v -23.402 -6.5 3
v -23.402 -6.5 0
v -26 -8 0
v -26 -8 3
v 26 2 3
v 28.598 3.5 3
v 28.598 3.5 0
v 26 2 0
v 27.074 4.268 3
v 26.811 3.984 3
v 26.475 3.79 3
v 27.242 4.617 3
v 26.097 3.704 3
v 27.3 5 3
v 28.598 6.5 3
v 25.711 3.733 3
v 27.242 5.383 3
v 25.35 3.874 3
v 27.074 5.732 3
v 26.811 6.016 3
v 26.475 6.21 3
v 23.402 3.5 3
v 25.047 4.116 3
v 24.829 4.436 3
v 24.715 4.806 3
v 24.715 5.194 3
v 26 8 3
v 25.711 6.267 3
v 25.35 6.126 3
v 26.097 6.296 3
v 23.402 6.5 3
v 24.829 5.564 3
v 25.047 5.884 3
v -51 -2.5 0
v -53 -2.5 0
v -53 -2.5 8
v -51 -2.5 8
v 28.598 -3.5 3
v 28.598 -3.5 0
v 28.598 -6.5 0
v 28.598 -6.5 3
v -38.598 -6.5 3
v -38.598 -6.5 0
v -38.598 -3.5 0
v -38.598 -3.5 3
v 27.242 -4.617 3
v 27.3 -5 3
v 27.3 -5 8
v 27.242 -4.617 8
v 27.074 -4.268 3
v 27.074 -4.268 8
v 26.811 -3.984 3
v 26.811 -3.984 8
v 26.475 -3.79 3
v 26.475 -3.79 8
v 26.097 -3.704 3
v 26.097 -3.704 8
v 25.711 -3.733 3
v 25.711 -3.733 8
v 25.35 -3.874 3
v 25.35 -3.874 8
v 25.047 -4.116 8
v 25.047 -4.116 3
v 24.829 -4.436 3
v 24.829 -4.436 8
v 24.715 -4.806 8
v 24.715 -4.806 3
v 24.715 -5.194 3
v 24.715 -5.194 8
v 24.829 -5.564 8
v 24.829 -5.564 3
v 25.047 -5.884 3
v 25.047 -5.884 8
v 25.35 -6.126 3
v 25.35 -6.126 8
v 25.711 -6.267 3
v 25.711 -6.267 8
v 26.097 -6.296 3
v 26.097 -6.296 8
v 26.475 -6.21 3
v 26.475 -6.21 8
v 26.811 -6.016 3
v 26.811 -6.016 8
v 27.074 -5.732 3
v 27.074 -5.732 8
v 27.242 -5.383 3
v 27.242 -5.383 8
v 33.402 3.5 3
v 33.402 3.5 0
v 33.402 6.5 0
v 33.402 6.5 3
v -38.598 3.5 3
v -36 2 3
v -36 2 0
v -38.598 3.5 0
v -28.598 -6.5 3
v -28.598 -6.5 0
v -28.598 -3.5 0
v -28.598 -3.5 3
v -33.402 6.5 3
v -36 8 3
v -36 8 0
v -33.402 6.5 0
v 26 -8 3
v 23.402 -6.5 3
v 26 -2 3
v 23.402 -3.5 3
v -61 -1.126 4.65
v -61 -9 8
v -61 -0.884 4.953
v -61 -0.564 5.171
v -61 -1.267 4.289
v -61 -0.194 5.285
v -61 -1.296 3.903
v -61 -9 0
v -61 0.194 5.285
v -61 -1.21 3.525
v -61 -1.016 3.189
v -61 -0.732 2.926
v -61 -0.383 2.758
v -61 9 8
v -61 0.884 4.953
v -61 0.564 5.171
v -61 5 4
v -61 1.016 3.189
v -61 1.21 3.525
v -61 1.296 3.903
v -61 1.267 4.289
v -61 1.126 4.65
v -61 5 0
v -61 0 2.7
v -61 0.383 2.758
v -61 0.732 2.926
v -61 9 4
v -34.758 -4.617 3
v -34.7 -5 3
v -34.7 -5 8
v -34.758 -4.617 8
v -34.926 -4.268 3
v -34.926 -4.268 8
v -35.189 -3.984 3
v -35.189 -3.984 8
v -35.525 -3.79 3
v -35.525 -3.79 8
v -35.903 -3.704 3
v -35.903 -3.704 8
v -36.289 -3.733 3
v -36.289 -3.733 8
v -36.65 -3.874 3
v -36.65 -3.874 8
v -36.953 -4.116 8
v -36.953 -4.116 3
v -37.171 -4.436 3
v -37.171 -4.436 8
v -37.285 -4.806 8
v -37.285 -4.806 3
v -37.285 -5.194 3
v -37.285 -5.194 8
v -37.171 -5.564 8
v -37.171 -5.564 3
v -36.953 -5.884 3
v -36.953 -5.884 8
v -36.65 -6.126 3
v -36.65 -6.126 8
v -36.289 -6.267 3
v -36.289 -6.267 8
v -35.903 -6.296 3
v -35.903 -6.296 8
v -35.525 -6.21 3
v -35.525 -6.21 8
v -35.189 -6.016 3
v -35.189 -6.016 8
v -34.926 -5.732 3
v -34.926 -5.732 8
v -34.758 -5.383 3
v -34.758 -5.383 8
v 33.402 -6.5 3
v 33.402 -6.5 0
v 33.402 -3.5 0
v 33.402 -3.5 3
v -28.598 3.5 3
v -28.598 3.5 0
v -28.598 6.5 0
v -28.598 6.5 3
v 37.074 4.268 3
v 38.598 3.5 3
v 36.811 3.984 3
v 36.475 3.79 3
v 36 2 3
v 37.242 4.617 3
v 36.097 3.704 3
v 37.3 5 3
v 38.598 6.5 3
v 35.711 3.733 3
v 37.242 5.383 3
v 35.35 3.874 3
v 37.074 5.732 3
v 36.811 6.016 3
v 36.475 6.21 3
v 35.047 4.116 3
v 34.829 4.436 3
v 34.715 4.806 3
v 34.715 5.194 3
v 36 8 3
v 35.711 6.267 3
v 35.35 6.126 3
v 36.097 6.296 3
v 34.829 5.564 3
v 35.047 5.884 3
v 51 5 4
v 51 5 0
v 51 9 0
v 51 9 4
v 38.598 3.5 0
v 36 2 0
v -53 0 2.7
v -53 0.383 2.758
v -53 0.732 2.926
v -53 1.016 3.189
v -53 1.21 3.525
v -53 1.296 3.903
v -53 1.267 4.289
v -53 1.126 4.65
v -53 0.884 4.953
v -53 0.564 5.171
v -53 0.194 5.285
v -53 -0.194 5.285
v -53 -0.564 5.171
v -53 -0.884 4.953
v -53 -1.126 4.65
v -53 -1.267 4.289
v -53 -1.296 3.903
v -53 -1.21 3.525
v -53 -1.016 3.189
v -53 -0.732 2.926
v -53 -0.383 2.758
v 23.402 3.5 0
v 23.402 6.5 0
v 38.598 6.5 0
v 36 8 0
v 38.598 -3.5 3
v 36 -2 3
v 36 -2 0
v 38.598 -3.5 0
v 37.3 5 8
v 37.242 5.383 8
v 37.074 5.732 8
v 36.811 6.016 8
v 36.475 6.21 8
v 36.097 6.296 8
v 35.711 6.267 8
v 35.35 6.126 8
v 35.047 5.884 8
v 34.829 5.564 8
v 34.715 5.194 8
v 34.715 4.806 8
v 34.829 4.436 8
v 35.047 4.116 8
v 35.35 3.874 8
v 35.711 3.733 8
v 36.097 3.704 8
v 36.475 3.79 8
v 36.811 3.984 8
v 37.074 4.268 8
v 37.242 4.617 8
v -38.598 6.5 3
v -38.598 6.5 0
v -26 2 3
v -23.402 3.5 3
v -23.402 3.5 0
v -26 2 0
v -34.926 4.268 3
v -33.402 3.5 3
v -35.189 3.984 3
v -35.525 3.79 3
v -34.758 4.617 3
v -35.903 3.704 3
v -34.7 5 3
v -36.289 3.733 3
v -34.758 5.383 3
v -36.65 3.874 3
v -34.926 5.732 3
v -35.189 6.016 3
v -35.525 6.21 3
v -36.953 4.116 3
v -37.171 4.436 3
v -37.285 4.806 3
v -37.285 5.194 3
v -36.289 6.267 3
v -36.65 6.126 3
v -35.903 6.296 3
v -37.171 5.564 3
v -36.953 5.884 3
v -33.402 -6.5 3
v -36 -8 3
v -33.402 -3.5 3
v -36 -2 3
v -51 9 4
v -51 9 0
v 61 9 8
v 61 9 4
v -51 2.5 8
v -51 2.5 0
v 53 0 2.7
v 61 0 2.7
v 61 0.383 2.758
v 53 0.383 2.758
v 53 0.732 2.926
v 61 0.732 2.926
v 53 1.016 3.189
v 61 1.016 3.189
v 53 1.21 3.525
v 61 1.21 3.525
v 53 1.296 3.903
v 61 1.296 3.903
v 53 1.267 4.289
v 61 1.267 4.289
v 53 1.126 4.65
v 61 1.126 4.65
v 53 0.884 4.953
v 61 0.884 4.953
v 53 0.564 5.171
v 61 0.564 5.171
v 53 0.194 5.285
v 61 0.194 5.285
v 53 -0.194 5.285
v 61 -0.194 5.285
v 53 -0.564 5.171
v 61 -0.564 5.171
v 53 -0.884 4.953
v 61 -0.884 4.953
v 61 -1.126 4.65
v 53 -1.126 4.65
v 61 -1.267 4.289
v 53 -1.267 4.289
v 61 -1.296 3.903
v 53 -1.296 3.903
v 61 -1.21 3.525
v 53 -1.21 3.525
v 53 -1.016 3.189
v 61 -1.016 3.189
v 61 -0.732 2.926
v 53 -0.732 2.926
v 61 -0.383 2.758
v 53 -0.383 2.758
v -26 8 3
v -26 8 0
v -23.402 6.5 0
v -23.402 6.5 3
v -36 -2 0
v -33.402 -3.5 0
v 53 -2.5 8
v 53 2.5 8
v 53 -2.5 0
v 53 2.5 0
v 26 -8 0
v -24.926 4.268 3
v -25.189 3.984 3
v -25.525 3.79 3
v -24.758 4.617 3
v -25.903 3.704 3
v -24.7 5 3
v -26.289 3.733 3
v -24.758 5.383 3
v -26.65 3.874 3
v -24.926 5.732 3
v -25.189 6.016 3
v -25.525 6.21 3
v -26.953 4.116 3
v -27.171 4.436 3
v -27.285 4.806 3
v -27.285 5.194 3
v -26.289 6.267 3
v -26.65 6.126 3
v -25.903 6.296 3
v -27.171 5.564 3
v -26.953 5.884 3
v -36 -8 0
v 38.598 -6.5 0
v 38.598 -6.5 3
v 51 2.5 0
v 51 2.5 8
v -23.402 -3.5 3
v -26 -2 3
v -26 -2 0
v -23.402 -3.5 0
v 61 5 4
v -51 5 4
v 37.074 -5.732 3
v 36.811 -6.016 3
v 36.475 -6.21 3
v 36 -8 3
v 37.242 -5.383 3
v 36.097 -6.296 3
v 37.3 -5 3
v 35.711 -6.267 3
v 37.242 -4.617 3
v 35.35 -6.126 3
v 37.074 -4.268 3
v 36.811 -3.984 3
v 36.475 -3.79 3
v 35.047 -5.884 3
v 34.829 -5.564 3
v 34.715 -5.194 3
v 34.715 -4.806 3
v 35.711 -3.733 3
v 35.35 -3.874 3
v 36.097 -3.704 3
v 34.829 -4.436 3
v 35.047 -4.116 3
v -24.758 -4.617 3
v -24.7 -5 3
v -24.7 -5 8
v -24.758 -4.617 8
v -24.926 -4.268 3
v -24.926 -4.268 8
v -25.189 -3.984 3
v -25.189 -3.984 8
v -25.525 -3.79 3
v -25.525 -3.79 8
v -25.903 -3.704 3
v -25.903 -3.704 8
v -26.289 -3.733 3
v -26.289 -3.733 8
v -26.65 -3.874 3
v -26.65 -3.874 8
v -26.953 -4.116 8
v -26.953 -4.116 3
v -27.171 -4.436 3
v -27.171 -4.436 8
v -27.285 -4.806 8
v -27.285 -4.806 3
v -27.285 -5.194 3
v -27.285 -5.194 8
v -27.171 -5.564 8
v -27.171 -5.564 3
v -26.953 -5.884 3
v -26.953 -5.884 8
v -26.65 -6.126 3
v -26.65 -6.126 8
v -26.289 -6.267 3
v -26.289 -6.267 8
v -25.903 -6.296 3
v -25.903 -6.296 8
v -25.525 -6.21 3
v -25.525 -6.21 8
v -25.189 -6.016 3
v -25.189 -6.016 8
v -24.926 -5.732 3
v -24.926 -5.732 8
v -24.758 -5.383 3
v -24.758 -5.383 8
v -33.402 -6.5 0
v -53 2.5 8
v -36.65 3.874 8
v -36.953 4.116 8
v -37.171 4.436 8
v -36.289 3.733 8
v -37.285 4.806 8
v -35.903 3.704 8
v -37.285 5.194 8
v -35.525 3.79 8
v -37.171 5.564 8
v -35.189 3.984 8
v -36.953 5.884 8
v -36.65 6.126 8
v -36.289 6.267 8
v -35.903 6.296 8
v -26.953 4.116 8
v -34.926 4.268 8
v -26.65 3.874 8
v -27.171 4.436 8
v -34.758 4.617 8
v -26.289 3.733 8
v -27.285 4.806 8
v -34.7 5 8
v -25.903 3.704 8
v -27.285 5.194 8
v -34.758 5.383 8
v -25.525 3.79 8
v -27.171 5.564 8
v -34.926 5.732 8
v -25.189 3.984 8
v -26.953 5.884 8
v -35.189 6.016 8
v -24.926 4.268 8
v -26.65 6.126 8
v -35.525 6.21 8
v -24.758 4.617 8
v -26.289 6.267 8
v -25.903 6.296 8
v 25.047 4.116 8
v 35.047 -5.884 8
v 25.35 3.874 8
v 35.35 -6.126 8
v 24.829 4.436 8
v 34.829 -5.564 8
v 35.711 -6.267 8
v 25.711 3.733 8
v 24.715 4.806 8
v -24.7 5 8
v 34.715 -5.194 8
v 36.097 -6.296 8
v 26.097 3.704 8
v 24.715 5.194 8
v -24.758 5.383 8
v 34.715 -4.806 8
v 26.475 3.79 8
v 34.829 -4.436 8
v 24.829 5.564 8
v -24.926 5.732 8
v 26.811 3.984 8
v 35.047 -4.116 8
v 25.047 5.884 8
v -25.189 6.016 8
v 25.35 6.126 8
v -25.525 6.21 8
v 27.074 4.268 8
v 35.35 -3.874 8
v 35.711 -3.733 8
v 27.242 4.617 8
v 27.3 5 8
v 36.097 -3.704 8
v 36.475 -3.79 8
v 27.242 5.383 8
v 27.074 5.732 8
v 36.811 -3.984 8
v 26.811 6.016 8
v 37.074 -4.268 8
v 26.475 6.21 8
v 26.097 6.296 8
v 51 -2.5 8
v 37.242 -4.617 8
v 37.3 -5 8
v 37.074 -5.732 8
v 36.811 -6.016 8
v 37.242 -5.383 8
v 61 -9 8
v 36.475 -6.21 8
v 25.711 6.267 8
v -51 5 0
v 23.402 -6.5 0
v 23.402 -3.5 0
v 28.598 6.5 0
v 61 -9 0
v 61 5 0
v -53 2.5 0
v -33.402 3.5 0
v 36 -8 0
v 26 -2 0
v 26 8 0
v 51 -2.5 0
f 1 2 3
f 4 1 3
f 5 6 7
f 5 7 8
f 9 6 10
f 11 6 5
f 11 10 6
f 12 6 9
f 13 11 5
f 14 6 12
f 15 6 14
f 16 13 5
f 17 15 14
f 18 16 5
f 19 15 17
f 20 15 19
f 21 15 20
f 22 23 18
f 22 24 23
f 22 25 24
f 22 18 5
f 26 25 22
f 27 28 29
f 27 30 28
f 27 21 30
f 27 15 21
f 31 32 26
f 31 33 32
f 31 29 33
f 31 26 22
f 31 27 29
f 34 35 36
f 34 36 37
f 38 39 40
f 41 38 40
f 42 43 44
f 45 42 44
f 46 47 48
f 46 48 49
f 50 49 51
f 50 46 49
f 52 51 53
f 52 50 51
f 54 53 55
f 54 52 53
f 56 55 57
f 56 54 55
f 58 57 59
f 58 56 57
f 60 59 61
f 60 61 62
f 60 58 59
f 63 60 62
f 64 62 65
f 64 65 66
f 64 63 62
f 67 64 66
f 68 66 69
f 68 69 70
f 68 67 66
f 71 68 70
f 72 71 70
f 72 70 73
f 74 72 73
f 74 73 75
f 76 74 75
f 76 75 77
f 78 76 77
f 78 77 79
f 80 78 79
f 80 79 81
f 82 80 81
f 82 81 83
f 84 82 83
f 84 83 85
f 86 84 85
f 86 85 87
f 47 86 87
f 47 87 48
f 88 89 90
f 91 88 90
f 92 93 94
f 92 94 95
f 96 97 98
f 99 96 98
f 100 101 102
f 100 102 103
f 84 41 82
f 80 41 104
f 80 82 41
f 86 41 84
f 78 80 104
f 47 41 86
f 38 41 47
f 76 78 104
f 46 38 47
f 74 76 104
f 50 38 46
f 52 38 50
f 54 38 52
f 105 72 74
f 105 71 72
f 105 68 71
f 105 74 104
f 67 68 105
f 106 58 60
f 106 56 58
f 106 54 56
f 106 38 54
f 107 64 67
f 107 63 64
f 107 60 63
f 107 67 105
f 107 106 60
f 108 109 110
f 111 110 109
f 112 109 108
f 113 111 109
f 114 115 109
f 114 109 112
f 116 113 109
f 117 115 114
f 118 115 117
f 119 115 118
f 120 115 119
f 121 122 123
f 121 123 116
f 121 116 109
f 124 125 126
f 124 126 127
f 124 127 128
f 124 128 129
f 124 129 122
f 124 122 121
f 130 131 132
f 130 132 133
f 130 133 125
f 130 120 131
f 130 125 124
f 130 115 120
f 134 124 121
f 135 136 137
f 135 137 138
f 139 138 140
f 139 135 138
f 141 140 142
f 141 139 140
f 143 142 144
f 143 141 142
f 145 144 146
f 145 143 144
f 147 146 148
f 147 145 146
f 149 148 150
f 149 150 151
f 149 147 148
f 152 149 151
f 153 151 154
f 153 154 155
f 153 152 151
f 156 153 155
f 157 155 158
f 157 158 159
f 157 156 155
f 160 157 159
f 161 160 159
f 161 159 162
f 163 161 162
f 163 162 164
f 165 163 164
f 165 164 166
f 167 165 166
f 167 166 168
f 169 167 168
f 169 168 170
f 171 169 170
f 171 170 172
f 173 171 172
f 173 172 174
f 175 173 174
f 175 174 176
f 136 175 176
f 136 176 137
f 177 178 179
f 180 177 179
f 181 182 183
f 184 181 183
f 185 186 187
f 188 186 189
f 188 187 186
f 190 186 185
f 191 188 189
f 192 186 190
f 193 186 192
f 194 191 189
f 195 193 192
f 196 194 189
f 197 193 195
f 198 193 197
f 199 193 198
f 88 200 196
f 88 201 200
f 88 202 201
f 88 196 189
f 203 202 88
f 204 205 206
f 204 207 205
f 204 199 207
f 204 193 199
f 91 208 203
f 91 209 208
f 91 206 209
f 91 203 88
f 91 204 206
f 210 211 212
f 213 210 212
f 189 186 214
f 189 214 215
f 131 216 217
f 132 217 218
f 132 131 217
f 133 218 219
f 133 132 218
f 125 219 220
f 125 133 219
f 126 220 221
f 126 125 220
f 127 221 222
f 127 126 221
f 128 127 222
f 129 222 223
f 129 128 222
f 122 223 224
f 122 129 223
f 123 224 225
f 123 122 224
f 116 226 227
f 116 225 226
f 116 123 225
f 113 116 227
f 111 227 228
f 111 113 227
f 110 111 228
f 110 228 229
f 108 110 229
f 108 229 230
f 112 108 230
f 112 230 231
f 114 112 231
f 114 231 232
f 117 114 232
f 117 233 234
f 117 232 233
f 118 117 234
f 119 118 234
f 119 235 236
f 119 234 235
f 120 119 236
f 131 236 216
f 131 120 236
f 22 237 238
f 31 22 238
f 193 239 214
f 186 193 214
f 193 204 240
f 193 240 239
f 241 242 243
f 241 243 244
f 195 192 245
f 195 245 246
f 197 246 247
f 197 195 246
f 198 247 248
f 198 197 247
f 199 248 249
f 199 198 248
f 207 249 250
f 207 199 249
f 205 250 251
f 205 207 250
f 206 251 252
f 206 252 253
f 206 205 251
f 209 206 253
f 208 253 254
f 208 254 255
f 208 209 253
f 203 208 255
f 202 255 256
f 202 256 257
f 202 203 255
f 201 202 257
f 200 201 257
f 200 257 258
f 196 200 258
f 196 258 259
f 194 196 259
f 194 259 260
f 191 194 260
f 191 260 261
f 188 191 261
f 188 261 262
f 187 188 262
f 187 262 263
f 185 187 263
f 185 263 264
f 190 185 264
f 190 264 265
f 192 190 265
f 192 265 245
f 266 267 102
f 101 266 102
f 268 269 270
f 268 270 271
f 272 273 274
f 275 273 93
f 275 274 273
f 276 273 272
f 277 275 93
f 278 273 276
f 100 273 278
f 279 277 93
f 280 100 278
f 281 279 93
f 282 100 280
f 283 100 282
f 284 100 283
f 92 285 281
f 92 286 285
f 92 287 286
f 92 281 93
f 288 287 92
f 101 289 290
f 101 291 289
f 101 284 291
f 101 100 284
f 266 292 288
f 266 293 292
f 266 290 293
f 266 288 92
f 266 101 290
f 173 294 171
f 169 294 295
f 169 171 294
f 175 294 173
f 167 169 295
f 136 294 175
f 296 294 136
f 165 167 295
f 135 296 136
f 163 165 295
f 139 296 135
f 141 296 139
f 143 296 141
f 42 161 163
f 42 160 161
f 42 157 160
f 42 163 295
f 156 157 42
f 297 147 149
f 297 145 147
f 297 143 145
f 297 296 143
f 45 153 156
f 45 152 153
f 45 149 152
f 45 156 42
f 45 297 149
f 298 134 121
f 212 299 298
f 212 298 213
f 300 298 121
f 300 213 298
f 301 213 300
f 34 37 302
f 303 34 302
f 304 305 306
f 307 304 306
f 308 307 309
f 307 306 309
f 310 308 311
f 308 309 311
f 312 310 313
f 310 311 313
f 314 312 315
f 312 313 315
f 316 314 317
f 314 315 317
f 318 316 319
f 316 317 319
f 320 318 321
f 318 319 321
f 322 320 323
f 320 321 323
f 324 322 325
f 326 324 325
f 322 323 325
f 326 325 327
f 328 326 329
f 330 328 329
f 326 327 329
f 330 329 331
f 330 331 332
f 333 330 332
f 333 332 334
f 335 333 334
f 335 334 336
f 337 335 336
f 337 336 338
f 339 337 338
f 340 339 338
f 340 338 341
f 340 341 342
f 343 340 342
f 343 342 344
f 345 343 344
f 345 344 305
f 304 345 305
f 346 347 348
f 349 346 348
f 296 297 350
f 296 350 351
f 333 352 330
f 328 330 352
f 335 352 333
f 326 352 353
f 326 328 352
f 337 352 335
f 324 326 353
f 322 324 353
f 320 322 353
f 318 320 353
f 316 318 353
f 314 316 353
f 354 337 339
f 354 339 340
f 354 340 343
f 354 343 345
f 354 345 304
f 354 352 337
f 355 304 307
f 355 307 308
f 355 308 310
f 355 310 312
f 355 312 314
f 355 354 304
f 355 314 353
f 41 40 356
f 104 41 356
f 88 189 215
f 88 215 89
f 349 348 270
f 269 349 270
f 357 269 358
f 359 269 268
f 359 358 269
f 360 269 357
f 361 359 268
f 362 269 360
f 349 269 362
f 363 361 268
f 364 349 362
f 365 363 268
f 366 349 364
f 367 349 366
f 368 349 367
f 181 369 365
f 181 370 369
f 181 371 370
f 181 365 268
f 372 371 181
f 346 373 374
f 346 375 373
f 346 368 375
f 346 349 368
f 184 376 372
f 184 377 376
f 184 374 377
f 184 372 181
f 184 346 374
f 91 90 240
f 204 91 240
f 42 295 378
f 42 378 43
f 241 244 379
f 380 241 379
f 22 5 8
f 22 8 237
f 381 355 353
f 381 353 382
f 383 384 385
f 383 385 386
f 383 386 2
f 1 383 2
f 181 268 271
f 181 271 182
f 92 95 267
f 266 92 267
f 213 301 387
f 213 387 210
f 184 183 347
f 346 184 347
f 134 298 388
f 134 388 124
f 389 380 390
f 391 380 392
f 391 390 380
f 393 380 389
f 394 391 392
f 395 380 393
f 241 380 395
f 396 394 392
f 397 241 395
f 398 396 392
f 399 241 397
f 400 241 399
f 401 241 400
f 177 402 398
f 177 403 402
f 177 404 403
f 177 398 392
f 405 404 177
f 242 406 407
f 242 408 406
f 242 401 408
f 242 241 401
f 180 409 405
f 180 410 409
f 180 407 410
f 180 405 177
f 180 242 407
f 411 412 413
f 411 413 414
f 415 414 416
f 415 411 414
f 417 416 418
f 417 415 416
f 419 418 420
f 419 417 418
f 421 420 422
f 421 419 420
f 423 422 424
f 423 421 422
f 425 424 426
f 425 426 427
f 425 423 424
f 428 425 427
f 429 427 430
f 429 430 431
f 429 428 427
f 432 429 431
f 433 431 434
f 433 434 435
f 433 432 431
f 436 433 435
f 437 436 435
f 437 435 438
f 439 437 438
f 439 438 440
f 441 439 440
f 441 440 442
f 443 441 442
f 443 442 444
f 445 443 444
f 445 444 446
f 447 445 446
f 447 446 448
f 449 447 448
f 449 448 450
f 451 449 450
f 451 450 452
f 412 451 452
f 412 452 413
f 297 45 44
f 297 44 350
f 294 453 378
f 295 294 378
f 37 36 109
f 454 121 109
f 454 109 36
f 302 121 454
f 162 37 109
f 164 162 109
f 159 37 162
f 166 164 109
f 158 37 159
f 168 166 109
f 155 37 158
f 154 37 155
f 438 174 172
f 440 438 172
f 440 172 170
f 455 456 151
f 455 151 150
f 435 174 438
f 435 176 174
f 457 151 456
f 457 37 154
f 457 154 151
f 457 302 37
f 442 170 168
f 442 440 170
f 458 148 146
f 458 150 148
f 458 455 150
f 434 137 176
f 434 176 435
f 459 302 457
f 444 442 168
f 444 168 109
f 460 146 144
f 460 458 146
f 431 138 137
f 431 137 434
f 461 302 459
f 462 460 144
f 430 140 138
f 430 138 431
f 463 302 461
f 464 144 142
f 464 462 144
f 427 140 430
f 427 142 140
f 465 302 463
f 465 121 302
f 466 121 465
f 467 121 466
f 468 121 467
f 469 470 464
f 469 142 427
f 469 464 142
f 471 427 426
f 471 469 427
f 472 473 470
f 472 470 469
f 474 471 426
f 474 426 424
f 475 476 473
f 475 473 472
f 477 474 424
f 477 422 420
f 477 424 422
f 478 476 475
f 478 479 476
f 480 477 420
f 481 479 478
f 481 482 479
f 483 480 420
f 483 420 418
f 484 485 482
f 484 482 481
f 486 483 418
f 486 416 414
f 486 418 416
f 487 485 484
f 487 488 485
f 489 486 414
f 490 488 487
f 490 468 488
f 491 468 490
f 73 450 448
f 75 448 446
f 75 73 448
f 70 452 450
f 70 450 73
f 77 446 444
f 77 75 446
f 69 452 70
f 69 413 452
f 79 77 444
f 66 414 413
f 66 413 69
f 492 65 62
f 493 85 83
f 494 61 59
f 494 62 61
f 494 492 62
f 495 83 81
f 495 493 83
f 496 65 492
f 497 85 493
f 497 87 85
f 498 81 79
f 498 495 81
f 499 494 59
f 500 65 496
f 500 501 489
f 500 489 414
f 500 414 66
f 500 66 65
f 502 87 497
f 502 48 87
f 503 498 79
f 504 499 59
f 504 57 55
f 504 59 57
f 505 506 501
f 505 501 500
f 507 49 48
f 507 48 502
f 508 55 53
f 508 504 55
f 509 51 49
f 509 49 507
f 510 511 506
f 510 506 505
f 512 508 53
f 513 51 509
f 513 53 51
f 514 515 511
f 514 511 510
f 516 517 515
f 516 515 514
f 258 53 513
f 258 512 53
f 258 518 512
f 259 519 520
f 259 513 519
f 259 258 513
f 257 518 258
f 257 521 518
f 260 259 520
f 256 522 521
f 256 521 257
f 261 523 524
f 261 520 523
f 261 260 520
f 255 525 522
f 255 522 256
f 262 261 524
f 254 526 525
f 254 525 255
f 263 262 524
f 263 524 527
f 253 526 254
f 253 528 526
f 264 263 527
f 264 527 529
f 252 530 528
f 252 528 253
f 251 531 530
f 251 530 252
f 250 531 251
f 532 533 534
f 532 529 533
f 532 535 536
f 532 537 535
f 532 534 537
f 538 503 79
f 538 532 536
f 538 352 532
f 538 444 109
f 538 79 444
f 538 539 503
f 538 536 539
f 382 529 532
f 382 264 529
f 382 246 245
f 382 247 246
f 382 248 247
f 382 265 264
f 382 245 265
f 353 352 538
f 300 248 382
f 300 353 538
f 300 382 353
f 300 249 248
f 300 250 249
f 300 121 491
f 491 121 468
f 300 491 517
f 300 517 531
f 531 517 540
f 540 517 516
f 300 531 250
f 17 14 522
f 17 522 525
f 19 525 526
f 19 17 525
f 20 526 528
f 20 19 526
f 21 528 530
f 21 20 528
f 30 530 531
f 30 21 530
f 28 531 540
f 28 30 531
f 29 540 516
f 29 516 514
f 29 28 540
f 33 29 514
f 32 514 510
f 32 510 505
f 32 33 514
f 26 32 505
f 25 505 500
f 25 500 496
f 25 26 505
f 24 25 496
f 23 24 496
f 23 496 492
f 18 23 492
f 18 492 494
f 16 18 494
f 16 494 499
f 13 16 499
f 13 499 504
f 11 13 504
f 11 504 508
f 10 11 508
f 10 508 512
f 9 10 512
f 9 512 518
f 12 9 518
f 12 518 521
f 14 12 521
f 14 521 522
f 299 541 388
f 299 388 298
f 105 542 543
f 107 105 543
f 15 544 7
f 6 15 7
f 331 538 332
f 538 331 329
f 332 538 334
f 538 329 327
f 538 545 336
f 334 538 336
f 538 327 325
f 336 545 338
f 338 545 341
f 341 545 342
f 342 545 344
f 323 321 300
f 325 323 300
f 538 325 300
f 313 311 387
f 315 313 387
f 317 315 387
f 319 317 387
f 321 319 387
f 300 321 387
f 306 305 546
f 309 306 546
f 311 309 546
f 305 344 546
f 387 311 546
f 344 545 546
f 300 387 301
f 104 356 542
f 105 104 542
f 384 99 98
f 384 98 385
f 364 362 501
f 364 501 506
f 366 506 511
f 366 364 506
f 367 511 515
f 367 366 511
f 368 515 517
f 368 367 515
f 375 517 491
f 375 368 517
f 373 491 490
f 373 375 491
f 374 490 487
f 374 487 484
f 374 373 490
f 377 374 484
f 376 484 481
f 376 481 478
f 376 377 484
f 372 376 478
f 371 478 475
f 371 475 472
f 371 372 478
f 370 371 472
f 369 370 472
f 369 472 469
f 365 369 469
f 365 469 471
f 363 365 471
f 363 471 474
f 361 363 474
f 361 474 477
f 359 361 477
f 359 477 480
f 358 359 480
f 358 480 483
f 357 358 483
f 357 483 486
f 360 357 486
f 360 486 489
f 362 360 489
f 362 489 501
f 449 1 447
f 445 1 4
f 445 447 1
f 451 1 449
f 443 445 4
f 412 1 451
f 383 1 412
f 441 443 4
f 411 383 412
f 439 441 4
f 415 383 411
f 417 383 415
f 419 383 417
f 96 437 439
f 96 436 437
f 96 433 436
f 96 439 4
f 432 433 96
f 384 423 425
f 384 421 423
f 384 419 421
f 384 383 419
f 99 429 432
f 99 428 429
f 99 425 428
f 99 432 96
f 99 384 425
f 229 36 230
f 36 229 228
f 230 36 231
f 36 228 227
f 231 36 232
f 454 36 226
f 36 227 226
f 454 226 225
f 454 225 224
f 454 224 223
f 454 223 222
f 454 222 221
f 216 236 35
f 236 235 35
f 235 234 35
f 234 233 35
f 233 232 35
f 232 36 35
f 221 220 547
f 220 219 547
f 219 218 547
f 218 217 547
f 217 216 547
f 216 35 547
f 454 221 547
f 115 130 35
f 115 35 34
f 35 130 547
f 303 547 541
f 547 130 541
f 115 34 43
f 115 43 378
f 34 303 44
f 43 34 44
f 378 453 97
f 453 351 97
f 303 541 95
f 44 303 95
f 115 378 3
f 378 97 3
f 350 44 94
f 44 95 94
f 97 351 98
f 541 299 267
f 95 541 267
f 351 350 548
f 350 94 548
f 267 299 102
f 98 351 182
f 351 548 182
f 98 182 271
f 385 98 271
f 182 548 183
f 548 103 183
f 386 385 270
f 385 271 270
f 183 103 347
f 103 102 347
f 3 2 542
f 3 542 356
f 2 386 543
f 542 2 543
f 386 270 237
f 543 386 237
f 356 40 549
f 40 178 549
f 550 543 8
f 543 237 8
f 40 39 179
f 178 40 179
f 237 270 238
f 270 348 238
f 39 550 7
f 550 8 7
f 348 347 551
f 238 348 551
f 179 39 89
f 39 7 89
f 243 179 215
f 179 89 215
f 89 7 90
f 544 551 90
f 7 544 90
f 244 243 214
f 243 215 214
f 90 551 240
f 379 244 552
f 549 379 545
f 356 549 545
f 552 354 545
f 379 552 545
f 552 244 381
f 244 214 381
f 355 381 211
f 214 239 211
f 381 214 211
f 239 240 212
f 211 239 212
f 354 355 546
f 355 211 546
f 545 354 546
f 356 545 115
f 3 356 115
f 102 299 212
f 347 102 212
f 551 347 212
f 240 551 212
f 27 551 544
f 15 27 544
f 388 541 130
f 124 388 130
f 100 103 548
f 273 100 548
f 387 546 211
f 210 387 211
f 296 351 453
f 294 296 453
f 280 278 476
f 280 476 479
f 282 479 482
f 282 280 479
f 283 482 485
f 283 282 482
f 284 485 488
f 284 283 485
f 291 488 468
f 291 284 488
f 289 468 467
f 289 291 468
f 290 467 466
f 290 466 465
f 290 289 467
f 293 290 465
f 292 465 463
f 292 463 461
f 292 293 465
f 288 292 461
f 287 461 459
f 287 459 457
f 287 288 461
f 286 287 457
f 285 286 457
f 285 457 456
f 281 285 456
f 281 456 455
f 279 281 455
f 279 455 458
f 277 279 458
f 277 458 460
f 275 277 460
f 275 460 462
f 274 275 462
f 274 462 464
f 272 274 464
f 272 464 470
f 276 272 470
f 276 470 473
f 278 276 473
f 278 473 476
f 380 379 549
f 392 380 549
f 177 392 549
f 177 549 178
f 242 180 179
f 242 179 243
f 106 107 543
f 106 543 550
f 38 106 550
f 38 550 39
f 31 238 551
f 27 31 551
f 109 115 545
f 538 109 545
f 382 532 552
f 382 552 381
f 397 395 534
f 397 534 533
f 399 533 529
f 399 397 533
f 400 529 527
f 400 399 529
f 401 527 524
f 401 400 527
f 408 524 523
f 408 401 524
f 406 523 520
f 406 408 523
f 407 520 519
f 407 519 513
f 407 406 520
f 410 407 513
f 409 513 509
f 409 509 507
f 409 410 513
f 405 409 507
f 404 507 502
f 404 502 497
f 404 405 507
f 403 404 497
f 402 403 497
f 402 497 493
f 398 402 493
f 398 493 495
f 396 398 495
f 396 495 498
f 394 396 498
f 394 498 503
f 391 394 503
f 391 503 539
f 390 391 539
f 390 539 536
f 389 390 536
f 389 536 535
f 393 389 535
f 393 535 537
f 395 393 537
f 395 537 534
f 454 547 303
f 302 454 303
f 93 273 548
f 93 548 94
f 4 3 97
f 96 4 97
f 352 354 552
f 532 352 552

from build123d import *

# Parameters (mm, degrees)
SKETCH1_W           = 122
SKETCH1_H           = 18
SKETCH1_R           = 1.3
BOSS_EXTRUDE1_DEPTH = 8
CUT_EXTRUDE1_DEPTH  = 3
SKETCH3_W           = 10
SKETCH3_H           = 4
CUT_EXTRUDE2_DEPTH  = 4
SKETCH4_R           = 1.3
CUT_EXTRUDE3_DEPTH  = 10
SKETCH5_W           = 2
SKETCH5_H           = 5
CUT_EXTRUDE4_DEPTH  = 10


with BuildPart() as part:
    # Sketch1 → Boss-Extrude1 (new body)
    with BuildSketch(Plane.XY):
        Rectangle(SKETCH1_W, SKETCH1_H)
        with Locations((-26, 5)):
            Circle(SKETCH1_R, mode=Mode.SUBTRACT)
        with Locations((-36, 5)):
            Circle(SKETCH1_R, mode=Mode.SUBTRACT)
        with Locations((-26, -5)):
            Circle(SKETCH1_R, mode=Mode.SUBTRACT)
        with Locations((-36, -5)):
            Circle(SKETCH1_R, mode=Mode.SUBTRACT)
        with Locations((26, -5)):
            Circle(SKETCH1_R, mode=Mode.SUBTRACT)
        with Locations((36, -5)):
            Circle(SKETCH1_R, mode=Mode.SUBTRACT)
        with Locations((36, 5)):
            Circle(SKETCH1_R, mode=Mode.SUBTRACT)
        with Locations((26, 5)):
            Circle(SKETCH1_R, mode=Mode.SUBTRACT)
    extrude(amount=BOSS_EXTRUDE1_DEPTH)

    # Sketch2 → Cut-Extrude1 (cut)
    with BuildSketch(Plane(origin=(0, 0, 0), x_dir=(-1, 0, 0), z_dir=(0, 0, -1))):
        Polygon((-36, 2), (-33.401923789, 3.5), (-33.401923789, 6.5), (-36, 8), (-38.598076211, 6.5), (-38.598076211, 3.5), align=None)
        Polygon((-26, 2), (-23.401923789, 3.5), (-23.401923789, 6.5), (-26, 8), (-28.598076211, 6.5), (-28.598076211, 3.5), align=None)
        Polygon((-26, -8), (-23.401923789, -6.5), (-23.401923789, -3.5), (-26, -2), (-28.598076211, -3.5), (-28.598076211, -6.5), align=None)
        Polygon((-36, -8), (-33.401923789, -6.5), (-33.401923789, -3.5), (-36, -2), (-38.598076211, -3.5), (-38.598076211, -6.5), align=None)
        Polygon((26, 2), (28.598076211, 3.5), (28.598076211, 6.5), (26, 8), (23.401923789, 6.5), (23.401923789, 3.5), align=None)
        Polygon((26, -8), (28.598076211, -6.5), (28.598076211, -3.5), (26, -2), (23.401923789, -3.5), (23.401923789, -6.5), align=None)
        Polygon((36, -8), (38.598076211, -6.5), (38.598076211, -3.5), (36, -2), (33.401923789, -3.5), (33.401923789, -6.5), align=None)
        Polygon((36, 2), (38.598076211, 3.5), (38.598076211, 6.5), (36, 8), (33.401923789, 6.5), (33.401923789, 3.5), align=None)
    extrude(amount=-CUT_EXTRUDE1_DEPTH, mode=Mode.SUBTRACT)

    # Sketch3 → Cut-Extrude2 (cut)
    with BuildSketch(Plane(origin=(0, 0, 0), x_dir=(-1, 0, 0), z_dir=(0, 0, -1))):
        with Locations((-56, 7)):
            Rectangle(SKETCH3_W, SKETCH3_H)
        with Locations((56, 7)):
            Rectangle(SKETCH3_W, SKETCH3_H)
    extrude(amount=-CUT_EXTRUDE2_DEPTH, mode=Mode.SUBTRACT)

    # Sketch4 → Cut-Extrude3 (cut)
    with BuildSketch(Plane(origin=(61, 0, 0), x_dir=(0, 0, -1), z_dir=(1, 0, 0))):
        with Locations((-4, 0)):
            Circle(SKETCH4_R)
    cut_extrude3 = extrude(amount=-CUT_EXTRUDE3_DEPTH, mode=Mode.SUBTRACT)

    # Sketch5 → Cut-Extrude4 (cut)
    with BuildSketch(Plane(origin=(0, 0, 0), x_dir=(-1, 0, 0), z_dir=(0, 0, -1))):
        with Locations((-52, 0)):
            Rectangle(SKETCH5_W, SKETCH5_H)
    cut_extrude4 = extrude(amount=-CUT_EXTRUDE4_DEPTH, mode=Mode.SUBTRACT)

    # Mirror1: Cut-Extrude3, Cut-Extrude4 across plane
    add(cut_extrude3.mirror(Plane(origin=(0, 0, 0), x_dir=(0, 0, 1), z_dir=(1, 0, 0))), mode=Mode.SUBTRACT)
    add(cut_extrude4.mirror(Plane(origin=(0, 0, 0), x_dir=(0, 0, 1), z_dir=(1, 0, 0))), mode=Mode.SUBTRACT)


solid = part.part
